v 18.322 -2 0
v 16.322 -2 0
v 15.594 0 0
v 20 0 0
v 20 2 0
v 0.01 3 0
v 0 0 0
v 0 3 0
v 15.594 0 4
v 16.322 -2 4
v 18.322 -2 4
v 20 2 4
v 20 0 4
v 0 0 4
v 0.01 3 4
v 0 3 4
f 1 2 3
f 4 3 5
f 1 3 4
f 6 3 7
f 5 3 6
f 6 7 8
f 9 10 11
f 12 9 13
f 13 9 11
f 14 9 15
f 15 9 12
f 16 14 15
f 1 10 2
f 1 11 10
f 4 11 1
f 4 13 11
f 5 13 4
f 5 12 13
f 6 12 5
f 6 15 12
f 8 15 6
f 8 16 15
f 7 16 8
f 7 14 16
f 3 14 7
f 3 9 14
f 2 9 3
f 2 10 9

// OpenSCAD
//Parametric snap fit elements 
//It is licensed under the Creative Commons - GNU GPL license.
// © 2011 by Mark "Ckaos" Moissette
//http://www.thingiverse.com/thing:

///////////////////////////////
//example usage

//snap_on(length=20, width=7, height=3, head_length=5);
snap_fit_cantilever();
//snap_on(length=20, width=12, height=4, head_length=5);
///////////////////////////////
// USER PARAMETERS
///////////////////////////////

// //////////////////////////////
// OpenSCAD SCRIPT
// //////////////////////////////

module snap_on(length=10, width=5, height=5, head_length=2, front_flat_extra=10, downslope=20)
{
	slope_length=length-head_length;
	downslope_base=min(head_length, (sin(downslope)*(height /cos(downslope))));

	xtra =0.01;
	difference()
	{
		union()
		{
			cube([length,width,height],center=true);
			translate([length,0,0]) cube([length,width,height],center=true);
		}
		
		translate([head_length/2,0,0])
		rotate([0,-90,-90])
		linear_extrude(height = width+xtra, center = true, convexity = 50, twist = 0)
		{
		polygon(points = 
			[[-height/2,-slope_length/2-downslope_base]
			,[-height/2-xtra,slope_length/2+xtra]
			,[height/2+xtra,-slope_length/2-xtra]
			]
			,paths = [[0,1,2]]);
		}
	}
}

module snap_in(length=10, width=5, height=5, head_length=2, front_flat_extra=10, downslope=20)
{

}

module snap_fit_cantilever(h0=3,h1=2,width=4,arm_length=20,land_length=2,overhang_depth=2,angle=40,return_angle=20)
{
	

	front_length=tan(angle)*overhang_depth;
	back_length=tan(return_angle)*overhang_depth;

	echo(front_length);

	linear_extrude(height =width)
	{
		//arm
		hull()
		{
			square([0.01,h0]);
			translate([arm_length-0.1,0,0]) square([0.1,h1]);
		}
		//head
		polygon(points = 
			[[arm_length,0]
			,[arm_length-front_length,-overhang_depth]
			,[arm_length-front_length-land_length,-overhang_depth]
			,[arm_length-front_length-land_length-back_length,0]
			]
			,paths = [[0,1,2,3]]);
		
	}
	
}
